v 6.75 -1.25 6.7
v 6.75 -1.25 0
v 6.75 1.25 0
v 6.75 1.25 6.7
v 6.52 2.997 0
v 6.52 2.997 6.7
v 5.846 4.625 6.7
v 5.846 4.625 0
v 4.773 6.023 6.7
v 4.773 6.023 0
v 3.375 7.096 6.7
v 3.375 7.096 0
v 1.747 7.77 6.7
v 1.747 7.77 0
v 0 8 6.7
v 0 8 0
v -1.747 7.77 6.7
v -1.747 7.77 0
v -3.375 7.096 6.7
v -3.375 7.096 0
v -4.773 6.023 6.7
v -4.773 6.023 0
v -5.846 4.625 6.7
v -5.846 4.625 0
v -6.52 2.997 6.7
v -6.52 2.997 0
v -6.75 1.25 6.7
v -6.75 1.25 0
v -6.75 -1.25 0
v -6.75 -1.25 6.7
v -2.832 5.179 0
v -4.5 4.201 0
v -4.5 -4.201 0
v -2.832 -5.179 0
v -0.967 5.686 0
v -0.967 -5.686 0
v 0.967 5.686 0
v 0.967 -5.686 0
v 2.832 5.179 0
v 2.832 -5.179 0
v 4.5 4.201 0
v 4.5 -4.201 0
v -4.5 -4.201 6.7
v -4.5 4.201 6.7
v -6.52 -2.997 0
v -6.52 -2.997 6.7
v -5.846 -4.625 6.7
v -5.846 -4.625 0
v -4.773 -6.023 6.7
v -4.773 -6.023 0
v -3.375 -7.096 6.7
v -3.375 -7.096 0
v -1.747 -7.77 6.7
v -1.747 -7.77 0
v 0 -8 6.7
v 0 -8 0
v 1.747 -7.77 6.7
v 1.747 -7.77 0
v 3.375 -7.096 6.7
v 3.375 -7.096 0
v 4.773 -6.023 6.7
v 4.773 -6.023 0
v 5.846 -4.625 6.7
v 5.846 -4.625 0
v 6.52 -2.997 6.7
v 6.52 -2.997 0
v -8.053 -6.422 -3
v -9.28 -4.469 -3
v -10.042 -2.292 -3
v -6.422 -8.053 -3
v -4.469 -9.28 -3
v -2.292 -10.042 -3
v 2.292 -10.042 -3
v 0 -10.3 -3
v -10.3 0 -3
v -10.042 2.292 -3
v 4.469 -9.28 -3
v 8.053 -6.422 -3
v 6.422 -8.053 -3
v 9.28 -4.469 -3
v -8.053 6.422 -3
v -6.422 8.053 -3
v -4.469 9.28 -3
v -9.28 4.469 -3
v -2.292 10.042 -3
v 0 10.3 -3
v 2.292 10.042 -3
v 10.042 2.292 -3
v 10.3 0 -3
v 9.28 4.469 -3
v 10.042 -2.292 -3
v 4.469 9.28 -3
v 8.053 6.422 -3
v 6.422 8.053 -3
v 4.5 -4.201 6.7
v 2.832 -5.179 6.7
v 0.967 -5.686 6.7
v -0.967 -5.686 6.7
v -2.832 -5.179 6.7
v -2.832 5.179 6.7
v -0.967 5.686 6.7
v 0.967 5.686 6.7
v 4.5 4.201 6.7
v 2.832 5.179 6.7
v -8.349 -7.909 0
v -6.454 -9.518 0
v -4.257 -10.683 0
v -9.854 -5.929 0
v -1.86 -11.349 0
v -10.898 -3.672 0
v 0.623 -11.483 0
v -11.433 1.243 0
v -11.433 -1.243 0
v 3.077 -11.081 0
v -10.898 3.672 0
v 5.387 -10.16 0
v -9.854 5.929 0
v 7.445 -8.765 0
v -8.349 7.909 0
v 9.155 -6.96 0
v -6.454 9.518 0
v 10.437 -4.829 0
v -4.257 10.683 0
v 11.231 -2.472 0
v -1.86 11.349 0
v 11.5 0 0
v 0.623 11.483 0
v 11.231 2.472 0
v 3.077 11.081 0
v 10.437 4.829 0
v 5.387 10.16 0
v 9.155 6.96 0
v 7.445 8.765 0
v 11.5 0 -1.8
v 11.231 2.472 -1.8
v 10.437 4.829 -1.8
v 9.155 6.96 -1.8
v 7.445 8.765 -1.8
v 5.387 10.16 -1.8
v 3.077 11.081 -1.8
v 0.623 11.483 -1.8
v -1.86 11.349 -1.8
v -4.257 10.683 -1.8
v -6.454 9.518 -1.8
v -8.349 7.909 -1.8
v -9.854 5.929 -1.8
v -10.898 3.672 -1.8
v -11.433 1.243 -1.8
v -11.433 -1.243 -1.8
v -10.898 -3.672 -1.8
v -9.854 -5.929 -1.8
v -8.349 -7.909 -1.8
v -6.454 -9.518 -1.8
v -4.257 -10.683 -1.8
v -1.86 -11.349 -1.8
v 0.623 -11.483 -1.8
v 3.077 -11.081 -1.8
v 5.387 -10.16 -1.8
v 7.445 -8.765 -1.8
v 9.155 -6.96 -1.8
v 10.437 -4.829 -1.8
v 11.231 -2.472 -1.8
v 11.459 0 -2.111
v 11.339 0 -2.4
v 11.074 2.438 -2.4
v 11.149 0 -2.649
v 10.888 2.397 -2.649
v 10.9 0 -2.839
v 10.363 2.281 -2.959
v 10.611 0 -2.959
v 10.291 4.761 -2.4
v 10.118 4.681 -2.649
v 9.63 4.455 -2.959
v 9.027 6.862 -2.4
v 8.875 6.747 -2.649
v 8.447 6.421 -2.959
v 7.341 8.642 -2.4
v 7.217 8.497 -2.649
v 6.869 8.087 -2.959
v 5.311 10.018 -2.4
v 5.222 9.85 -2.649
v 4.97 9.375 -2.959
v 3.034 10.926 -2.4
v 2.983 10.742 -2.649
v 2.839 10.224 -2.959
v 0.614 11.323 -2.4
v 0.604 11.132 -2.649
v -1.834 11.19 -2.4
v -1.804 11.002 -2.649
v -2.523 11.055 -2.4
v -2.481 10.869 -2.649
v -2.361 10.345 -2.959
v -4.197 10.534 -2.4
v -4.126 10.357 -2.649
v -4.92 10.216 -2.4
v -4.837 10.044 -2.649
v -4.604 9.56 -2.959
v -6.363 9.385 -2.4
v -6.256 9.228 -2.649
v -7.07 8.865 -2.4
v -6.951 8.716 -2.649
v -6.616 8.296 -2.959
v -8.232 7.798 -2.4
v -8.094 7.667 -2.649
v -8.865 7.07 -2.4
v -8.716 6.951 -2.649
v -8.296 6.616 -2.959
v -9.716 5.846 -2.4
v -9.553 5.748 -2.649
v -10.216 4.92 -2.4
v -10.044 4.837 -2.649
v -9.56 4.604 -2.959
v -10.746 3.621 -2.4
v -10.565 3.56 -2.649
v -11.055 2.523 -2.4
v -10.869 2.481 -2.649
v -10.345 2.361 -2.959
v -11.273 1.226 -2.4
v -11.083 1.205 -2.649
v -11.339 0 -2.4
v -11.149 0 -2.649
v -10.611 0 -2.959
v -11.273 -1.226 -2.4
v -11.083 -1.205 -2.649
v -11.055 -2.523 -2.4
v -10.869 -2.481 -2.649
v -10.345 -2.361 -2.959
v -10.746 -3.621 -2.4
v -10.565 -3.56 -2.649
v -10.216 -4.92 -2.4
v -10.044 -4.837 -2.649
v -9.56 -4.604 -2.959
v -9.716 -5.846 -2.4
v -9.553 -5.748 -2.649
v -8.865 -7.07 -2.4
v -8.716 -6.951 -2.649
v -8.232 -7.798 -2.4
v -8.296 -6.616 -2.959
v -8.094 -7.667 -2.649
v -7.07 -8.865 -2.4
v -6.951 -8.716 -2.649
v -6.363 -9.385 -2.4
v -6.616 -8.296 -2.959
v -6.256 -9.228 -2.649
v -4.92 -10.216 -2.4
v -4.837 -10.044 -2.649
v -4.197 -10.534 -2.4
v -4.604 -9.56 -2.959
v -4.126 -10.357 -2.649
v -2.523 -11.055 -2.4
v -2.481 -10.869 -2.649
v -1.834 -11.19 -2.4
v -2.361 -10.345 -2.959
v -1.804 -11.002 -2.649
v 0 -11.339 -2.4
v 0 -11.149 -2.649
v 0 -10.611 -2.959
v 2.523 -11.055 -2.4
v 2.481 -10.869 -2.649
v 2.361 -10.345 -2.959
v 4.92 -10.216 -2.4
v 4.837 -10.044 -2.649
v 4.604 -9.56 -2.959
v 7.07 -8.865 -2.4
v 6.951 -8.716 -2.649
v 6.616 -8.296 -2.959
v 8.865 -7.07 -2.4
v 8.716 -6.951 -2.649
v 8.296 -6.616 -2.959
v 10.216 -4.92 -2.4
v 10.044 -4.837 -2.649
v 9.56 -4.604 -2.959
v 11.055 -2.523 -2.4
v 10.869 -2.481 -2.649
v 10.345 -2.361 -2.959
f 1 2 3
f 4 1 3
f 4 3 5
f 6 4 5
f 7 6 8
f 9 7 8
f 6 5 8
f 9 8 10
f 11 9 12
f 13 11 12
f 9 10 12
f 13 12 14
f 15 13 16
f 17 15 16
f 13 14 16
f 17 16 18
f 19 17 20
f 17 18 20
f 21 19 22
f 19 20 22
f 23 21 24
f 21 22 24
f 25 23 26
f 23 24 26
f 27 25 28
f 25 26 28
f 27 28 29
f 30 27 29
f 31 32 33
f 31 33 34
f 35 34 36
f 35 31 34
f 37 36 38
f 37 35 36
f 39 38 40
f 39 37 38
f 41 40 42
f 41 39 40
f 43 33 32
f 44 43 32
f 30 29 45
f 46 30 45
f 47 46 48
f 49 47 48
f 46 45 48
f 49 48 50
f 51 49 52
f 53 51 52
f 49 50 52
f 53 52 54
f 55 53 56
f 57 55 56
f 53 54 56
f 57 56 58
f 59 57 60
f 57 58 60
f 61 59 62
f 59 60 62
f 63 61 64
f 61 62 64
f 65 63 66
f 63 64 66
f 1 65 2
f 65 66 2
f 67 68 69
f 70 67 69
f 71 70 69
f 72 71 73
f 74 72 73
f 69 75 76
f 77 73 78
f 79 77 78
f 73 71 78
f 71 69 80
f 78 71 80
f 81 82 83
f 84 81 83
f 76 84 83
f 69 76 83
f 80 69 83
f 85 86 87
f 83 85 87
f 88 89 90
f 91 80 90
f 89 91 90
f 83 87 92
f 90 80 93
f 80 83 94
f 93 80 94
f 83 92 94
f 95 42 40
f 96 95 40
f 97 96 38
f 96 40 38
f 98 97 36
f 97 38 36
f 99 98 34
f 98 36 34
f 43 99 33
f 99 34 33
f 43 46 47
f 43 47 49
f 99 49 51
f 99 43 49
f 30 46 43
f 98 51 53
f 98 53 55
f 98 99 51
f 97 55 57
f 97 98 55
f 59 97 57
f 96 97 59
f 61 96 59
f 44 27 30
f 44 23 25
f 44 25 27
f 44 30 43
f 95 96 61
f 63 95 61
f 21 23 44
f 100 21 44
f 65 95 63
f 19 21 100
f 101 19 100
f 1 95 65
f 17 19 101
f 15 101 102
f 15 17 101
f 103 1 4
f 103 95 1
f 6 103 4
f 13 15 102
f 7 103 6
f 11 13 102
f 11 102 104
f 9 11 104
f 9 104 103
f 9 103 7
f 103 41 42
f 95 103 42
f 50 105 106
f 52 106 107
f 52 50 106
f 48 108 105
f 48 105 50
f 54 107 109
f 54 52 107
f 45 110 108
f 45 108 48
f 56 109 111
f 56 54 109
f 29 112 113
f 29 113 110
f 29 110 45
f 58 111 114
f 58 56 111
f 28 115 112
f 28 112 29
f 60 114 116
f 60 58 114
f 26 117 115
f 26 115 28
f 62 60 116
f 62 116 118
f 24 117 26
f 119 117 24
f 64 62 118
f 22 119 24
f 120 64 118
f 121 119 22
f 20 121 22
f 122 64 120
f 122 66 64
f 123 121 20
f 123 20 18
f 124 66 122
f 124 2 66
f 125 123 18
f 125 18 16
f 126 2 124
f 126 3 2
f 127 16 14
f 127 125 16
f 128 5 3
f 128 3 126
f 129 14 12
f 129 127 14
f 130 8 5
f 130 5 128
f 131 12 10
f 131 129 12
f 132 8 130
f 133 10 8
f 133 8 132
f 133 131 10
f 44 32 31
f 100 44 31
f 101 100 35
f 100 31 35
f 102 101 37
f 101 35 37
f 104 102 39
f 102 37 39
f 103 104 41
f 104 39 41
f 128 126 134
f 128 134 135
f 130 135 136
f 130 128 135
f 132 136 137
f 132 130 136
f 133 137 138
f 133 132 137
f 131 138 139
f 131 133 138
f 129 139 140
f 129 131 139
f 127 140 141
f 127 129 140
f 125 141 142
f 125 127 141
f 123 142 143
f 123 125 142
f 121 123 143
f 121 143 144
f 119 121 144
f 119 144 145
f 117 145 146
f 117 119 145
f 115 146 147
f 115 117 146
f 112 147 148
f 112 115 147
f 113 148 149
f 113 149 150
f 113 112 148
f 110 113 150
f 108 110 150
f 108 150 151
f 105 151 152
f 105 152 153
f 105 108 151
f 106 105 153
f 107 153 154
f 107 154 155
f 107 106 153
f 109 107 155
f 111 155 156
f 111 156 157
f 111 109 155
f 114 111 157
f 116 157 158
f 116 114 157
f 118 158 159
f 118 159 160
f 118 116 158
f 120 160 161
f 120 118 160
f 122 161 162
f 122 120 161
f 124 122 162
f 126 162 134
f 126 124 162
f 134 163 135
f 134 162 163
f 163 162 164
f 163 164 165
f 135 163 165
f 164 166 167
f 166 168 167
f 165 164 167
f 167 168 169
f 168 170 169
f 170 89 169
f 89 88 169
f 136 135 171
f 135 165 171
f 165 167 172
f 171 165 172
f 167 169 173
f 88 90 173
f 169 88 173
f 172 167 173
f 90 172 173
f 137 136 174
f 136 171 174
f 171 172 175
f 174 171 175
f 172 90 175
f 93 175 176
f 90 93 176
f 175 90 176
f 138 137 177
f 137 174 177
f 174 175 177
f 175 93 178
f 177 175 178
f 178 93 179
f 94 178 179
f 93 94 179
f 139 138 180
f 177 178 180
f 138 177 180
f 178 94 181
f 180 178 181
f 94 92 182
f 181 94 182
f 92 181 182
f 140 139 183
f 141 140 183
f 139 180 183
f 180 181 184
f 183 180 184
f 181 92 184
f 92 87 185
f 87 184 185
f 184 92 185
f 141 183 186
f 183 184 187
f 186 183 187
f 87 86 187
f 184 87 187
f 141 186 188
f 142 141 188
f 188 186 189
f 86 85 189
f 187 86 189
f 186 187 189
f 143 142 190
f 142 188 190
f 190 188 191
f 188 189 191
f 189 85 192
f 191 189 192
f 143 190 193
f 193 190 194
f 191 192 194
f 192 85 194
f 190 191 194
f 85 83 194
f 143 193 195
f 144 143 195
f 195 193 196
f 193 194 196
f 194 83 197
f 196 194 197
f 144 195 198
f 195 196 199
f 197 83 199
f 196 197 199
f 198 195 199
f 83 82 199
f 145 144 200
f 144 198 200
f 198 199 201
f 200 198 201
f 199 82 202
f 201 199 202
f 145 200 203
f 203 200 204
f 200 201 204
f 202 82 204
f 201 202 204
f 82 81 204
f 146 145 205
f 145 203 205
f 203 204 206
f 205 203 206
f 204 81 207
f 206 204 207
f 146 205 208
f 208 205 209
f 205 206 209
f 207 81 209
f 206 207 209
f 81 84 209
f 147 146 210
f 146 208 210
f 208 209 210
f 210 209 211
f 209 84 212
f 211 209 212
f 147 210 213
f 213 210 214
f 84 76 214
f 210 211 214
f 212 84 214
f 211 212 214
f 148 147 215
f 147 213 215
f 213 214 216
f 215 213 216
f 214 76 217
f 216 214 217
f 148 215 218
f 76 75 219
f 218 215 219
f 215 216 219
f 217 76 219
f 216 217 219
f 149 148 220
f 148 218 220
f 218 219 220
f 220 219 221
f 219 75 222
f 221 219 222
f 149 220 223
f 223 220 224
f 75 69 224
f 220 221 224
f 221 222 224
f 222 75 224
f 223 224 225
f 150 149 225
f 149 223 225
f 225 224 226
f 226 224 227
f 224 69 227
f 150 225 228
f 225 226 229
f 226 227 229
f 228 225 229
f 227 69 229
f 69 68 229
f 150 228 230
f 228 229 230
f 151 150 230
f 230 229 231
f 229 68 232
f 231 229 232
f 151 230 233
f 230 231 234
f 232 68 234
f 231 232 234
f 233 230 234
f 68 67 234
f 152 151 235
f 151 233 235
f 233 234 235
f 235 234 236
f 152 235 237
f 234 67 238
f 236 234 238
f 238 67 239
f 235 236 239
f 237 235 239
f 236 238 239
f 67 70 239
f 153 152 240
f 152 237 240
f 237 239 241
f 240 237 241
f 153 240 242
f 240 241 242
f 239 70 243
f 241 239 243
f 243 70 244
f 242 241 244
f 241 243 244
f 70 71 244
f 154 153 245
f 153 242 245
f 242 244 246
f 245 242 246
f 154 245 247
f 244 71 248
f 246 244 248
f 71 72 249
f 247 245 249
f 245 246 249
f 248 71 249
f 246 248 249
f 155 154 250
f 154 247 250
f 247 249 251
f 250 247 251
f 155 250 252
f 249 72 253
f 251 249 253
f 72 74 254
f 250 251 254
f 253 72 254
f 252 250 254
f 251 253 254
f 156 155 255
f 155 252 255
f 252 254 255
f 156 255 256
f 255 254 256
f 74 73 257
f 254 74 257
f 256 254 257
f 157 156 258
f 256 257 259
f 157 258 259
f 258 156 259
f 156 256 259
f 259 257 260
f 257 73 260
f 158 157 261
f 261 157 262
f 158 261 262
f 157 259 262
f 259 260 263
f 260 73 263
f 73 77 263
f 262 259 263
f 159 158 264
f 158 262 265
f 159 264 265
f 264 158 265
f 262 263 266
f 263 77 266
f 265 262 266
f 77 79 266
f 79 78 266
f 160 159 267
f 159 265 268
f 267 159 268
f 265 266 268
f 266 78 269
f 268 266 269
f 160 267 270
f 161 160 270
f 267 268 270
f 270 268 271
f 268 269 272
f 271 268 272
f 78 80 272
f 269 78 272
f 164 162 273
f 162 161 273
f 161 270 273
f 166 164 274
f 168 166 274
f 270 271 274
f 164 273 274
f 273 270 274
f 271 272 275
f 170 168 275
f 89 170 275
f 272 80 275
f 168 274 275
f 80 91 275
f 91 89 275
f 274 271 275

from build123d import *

# Parameters (mm, degrees)
F0_R     = 11.5
F1_DEPTH = 3
F2_R     = 1.2
F3_DEPTH = 6.7


with BuildPart() as f1:
    # F0 (on Top) → F1 (new body)
    with BuildSketch(Plane.XY):
        Circle(F0_R)
        with BuildLine():
            ThreePointArc((-6.75, 1.25), (0, 8), (6.75, 1.25))
            Line((6.75, 1.25), (6.75, -1.25))
            ThreePointArc((6.75, -1.25), (0, -8), (-6.75, -1.25))
            Line((-6.75, -1.25), (-6.75, 1.25))
        make_face(mode=Mode.SUBTRACT)
        with BuildLine():
            ThreePointArc((4.5, 4.20141), (5.815353, 2.87082), (6.75, 1.25))
            ThreePointArc((6.75, 1.25), (0, 8), (-6.75, 1.25))
            ThreePointArc((-6.75, 1.25), (-5.815353, 2.87082), (-4.5, 4.20141))
            ThreePointArc((-4.5, 4.20141), (0, 5.75), (4.5, 4.20141))
        make_face()
        with BuildLine():
            ThreePointArc((-4.5, 4.20141), (-5.815353, 2.87082), (-6.75, 1.25))
            Line((-6.75, 1.25), (-6.75, -1.25))
            ThreePointArc((-6.75, -1.25), (-5.815353, -2.87082), (-4.5, -4.20141))
            Line((-4.5, -4.20141), (-4.5, 4.20141))
        make_face()
        with BuildLine():
            Line((4.5, -4.20141), (4.5, 4.20141))
            ThreePointArc((4.5, 4.20141), (0, 5.75), (-4.5, 4.20141))
            Line((-4.5, 4.20141), (-4.5, -4.20141))
            ThreePointArc((-4.5, -4.20141), (0, -5.75), (4.5, -4.20141))
        make_face()
        with BuildLine():
            ThreePointArc((-6.75, -1.25), (0, -8), (6.75, -1.25))
            ThreePointArc((6.75, -1.25), (5.815353, -2.87082), (4.5, -4.20141))
            ThreePointArc((4.5, -4.20141), (0, -5.75), (-4.5, -4.20141))
            ThreePointArc((-4.5, -4.20141), (-5.815353, -2.87082), (-6.75, -1.25))
        make_face()
        with BuildLine():
            Line((6.75, -1.25), (6.75, 1.25))
            ThreePointArc((6.75, 1.25), (5.815353, 2.87082), (4.5, 4.20141))
            Line((4.5, 4.20141), (4.5, -4.20141))
            ThreePointArc((4.5, -4.20141), (5.815353, -2.87082), (6.75, -1.25))
        make_face()
    extrude(amount=-F1_DEPTH)

    # F2
    f2_edges = [f1.edges().sort_by_distance(p)[0] for p in [
        (-11.5, 0, -3),
    ]]
    fillet(f2_edges, radius=F2_R)

    # F0 (on Top) → F3 (join)
    with BuildSketch(Plane.XY):
        with BuildLine():
            ThreePointArc((-4.5, 4.20141), (-5.815353, 2.87082), (-6.75, 1.25))
            Line((-6.75, 1.25), (-6.75, -1.25))
            ThreePointArc((-6.75, -1.25), (-5.815353, -2.87082), (-4.5, -4.20141))
            Line((-4.5, -4.20141), (-4.5, 4.20141))
        make_face()
        with BuildLine():
            ThreePointArc((4.5, 4.20141), (5.815353, 2.87082), (6.75, 1.25))
            ThreePointArc((6.75, 1.25), (0, 8), (-6.75, 1.25))
            ThreePointArc((-6.75, 1.25), (-5.815353, 2.87082), (-4.5, 4.20141))
            ThreePointArc((-4.5, 4.20141), (0, 5.75), (4.5, 4.20141))
        make_face()
        with BuildLine():
            Line((6.75, -1.25), (6.75, 1.25))
            ThreePointArc((6.75, 1.25), (5.815353, 2.87082), (4.5, 4.20141))
            Line((4.5, 4.20141), (4.5, -4.20141))
            ThreePointArc((4.5, -4.20141), (5.815353, -2.87082), (6.75, -1.25))
        make_face()
        with BuildLine():
            ThreePointArc((-6.75, -1.25), (0, -8), (6.75, -1.25))
            ThreePointArc((6.75, -1.25), (5.815353, -2.87082), (4.5, -4.20141))
            ThreePointArc((4.5, -4.20141), (0, -5.75), (-4.5, -4.20141))
            ThreePointArc((-4.5, -4.20141), (-5.815353, -2.87082), (-6.75, -1.25))
        make_face()
    extrude(amount=F3_DEPTH)


solid = f1.part
